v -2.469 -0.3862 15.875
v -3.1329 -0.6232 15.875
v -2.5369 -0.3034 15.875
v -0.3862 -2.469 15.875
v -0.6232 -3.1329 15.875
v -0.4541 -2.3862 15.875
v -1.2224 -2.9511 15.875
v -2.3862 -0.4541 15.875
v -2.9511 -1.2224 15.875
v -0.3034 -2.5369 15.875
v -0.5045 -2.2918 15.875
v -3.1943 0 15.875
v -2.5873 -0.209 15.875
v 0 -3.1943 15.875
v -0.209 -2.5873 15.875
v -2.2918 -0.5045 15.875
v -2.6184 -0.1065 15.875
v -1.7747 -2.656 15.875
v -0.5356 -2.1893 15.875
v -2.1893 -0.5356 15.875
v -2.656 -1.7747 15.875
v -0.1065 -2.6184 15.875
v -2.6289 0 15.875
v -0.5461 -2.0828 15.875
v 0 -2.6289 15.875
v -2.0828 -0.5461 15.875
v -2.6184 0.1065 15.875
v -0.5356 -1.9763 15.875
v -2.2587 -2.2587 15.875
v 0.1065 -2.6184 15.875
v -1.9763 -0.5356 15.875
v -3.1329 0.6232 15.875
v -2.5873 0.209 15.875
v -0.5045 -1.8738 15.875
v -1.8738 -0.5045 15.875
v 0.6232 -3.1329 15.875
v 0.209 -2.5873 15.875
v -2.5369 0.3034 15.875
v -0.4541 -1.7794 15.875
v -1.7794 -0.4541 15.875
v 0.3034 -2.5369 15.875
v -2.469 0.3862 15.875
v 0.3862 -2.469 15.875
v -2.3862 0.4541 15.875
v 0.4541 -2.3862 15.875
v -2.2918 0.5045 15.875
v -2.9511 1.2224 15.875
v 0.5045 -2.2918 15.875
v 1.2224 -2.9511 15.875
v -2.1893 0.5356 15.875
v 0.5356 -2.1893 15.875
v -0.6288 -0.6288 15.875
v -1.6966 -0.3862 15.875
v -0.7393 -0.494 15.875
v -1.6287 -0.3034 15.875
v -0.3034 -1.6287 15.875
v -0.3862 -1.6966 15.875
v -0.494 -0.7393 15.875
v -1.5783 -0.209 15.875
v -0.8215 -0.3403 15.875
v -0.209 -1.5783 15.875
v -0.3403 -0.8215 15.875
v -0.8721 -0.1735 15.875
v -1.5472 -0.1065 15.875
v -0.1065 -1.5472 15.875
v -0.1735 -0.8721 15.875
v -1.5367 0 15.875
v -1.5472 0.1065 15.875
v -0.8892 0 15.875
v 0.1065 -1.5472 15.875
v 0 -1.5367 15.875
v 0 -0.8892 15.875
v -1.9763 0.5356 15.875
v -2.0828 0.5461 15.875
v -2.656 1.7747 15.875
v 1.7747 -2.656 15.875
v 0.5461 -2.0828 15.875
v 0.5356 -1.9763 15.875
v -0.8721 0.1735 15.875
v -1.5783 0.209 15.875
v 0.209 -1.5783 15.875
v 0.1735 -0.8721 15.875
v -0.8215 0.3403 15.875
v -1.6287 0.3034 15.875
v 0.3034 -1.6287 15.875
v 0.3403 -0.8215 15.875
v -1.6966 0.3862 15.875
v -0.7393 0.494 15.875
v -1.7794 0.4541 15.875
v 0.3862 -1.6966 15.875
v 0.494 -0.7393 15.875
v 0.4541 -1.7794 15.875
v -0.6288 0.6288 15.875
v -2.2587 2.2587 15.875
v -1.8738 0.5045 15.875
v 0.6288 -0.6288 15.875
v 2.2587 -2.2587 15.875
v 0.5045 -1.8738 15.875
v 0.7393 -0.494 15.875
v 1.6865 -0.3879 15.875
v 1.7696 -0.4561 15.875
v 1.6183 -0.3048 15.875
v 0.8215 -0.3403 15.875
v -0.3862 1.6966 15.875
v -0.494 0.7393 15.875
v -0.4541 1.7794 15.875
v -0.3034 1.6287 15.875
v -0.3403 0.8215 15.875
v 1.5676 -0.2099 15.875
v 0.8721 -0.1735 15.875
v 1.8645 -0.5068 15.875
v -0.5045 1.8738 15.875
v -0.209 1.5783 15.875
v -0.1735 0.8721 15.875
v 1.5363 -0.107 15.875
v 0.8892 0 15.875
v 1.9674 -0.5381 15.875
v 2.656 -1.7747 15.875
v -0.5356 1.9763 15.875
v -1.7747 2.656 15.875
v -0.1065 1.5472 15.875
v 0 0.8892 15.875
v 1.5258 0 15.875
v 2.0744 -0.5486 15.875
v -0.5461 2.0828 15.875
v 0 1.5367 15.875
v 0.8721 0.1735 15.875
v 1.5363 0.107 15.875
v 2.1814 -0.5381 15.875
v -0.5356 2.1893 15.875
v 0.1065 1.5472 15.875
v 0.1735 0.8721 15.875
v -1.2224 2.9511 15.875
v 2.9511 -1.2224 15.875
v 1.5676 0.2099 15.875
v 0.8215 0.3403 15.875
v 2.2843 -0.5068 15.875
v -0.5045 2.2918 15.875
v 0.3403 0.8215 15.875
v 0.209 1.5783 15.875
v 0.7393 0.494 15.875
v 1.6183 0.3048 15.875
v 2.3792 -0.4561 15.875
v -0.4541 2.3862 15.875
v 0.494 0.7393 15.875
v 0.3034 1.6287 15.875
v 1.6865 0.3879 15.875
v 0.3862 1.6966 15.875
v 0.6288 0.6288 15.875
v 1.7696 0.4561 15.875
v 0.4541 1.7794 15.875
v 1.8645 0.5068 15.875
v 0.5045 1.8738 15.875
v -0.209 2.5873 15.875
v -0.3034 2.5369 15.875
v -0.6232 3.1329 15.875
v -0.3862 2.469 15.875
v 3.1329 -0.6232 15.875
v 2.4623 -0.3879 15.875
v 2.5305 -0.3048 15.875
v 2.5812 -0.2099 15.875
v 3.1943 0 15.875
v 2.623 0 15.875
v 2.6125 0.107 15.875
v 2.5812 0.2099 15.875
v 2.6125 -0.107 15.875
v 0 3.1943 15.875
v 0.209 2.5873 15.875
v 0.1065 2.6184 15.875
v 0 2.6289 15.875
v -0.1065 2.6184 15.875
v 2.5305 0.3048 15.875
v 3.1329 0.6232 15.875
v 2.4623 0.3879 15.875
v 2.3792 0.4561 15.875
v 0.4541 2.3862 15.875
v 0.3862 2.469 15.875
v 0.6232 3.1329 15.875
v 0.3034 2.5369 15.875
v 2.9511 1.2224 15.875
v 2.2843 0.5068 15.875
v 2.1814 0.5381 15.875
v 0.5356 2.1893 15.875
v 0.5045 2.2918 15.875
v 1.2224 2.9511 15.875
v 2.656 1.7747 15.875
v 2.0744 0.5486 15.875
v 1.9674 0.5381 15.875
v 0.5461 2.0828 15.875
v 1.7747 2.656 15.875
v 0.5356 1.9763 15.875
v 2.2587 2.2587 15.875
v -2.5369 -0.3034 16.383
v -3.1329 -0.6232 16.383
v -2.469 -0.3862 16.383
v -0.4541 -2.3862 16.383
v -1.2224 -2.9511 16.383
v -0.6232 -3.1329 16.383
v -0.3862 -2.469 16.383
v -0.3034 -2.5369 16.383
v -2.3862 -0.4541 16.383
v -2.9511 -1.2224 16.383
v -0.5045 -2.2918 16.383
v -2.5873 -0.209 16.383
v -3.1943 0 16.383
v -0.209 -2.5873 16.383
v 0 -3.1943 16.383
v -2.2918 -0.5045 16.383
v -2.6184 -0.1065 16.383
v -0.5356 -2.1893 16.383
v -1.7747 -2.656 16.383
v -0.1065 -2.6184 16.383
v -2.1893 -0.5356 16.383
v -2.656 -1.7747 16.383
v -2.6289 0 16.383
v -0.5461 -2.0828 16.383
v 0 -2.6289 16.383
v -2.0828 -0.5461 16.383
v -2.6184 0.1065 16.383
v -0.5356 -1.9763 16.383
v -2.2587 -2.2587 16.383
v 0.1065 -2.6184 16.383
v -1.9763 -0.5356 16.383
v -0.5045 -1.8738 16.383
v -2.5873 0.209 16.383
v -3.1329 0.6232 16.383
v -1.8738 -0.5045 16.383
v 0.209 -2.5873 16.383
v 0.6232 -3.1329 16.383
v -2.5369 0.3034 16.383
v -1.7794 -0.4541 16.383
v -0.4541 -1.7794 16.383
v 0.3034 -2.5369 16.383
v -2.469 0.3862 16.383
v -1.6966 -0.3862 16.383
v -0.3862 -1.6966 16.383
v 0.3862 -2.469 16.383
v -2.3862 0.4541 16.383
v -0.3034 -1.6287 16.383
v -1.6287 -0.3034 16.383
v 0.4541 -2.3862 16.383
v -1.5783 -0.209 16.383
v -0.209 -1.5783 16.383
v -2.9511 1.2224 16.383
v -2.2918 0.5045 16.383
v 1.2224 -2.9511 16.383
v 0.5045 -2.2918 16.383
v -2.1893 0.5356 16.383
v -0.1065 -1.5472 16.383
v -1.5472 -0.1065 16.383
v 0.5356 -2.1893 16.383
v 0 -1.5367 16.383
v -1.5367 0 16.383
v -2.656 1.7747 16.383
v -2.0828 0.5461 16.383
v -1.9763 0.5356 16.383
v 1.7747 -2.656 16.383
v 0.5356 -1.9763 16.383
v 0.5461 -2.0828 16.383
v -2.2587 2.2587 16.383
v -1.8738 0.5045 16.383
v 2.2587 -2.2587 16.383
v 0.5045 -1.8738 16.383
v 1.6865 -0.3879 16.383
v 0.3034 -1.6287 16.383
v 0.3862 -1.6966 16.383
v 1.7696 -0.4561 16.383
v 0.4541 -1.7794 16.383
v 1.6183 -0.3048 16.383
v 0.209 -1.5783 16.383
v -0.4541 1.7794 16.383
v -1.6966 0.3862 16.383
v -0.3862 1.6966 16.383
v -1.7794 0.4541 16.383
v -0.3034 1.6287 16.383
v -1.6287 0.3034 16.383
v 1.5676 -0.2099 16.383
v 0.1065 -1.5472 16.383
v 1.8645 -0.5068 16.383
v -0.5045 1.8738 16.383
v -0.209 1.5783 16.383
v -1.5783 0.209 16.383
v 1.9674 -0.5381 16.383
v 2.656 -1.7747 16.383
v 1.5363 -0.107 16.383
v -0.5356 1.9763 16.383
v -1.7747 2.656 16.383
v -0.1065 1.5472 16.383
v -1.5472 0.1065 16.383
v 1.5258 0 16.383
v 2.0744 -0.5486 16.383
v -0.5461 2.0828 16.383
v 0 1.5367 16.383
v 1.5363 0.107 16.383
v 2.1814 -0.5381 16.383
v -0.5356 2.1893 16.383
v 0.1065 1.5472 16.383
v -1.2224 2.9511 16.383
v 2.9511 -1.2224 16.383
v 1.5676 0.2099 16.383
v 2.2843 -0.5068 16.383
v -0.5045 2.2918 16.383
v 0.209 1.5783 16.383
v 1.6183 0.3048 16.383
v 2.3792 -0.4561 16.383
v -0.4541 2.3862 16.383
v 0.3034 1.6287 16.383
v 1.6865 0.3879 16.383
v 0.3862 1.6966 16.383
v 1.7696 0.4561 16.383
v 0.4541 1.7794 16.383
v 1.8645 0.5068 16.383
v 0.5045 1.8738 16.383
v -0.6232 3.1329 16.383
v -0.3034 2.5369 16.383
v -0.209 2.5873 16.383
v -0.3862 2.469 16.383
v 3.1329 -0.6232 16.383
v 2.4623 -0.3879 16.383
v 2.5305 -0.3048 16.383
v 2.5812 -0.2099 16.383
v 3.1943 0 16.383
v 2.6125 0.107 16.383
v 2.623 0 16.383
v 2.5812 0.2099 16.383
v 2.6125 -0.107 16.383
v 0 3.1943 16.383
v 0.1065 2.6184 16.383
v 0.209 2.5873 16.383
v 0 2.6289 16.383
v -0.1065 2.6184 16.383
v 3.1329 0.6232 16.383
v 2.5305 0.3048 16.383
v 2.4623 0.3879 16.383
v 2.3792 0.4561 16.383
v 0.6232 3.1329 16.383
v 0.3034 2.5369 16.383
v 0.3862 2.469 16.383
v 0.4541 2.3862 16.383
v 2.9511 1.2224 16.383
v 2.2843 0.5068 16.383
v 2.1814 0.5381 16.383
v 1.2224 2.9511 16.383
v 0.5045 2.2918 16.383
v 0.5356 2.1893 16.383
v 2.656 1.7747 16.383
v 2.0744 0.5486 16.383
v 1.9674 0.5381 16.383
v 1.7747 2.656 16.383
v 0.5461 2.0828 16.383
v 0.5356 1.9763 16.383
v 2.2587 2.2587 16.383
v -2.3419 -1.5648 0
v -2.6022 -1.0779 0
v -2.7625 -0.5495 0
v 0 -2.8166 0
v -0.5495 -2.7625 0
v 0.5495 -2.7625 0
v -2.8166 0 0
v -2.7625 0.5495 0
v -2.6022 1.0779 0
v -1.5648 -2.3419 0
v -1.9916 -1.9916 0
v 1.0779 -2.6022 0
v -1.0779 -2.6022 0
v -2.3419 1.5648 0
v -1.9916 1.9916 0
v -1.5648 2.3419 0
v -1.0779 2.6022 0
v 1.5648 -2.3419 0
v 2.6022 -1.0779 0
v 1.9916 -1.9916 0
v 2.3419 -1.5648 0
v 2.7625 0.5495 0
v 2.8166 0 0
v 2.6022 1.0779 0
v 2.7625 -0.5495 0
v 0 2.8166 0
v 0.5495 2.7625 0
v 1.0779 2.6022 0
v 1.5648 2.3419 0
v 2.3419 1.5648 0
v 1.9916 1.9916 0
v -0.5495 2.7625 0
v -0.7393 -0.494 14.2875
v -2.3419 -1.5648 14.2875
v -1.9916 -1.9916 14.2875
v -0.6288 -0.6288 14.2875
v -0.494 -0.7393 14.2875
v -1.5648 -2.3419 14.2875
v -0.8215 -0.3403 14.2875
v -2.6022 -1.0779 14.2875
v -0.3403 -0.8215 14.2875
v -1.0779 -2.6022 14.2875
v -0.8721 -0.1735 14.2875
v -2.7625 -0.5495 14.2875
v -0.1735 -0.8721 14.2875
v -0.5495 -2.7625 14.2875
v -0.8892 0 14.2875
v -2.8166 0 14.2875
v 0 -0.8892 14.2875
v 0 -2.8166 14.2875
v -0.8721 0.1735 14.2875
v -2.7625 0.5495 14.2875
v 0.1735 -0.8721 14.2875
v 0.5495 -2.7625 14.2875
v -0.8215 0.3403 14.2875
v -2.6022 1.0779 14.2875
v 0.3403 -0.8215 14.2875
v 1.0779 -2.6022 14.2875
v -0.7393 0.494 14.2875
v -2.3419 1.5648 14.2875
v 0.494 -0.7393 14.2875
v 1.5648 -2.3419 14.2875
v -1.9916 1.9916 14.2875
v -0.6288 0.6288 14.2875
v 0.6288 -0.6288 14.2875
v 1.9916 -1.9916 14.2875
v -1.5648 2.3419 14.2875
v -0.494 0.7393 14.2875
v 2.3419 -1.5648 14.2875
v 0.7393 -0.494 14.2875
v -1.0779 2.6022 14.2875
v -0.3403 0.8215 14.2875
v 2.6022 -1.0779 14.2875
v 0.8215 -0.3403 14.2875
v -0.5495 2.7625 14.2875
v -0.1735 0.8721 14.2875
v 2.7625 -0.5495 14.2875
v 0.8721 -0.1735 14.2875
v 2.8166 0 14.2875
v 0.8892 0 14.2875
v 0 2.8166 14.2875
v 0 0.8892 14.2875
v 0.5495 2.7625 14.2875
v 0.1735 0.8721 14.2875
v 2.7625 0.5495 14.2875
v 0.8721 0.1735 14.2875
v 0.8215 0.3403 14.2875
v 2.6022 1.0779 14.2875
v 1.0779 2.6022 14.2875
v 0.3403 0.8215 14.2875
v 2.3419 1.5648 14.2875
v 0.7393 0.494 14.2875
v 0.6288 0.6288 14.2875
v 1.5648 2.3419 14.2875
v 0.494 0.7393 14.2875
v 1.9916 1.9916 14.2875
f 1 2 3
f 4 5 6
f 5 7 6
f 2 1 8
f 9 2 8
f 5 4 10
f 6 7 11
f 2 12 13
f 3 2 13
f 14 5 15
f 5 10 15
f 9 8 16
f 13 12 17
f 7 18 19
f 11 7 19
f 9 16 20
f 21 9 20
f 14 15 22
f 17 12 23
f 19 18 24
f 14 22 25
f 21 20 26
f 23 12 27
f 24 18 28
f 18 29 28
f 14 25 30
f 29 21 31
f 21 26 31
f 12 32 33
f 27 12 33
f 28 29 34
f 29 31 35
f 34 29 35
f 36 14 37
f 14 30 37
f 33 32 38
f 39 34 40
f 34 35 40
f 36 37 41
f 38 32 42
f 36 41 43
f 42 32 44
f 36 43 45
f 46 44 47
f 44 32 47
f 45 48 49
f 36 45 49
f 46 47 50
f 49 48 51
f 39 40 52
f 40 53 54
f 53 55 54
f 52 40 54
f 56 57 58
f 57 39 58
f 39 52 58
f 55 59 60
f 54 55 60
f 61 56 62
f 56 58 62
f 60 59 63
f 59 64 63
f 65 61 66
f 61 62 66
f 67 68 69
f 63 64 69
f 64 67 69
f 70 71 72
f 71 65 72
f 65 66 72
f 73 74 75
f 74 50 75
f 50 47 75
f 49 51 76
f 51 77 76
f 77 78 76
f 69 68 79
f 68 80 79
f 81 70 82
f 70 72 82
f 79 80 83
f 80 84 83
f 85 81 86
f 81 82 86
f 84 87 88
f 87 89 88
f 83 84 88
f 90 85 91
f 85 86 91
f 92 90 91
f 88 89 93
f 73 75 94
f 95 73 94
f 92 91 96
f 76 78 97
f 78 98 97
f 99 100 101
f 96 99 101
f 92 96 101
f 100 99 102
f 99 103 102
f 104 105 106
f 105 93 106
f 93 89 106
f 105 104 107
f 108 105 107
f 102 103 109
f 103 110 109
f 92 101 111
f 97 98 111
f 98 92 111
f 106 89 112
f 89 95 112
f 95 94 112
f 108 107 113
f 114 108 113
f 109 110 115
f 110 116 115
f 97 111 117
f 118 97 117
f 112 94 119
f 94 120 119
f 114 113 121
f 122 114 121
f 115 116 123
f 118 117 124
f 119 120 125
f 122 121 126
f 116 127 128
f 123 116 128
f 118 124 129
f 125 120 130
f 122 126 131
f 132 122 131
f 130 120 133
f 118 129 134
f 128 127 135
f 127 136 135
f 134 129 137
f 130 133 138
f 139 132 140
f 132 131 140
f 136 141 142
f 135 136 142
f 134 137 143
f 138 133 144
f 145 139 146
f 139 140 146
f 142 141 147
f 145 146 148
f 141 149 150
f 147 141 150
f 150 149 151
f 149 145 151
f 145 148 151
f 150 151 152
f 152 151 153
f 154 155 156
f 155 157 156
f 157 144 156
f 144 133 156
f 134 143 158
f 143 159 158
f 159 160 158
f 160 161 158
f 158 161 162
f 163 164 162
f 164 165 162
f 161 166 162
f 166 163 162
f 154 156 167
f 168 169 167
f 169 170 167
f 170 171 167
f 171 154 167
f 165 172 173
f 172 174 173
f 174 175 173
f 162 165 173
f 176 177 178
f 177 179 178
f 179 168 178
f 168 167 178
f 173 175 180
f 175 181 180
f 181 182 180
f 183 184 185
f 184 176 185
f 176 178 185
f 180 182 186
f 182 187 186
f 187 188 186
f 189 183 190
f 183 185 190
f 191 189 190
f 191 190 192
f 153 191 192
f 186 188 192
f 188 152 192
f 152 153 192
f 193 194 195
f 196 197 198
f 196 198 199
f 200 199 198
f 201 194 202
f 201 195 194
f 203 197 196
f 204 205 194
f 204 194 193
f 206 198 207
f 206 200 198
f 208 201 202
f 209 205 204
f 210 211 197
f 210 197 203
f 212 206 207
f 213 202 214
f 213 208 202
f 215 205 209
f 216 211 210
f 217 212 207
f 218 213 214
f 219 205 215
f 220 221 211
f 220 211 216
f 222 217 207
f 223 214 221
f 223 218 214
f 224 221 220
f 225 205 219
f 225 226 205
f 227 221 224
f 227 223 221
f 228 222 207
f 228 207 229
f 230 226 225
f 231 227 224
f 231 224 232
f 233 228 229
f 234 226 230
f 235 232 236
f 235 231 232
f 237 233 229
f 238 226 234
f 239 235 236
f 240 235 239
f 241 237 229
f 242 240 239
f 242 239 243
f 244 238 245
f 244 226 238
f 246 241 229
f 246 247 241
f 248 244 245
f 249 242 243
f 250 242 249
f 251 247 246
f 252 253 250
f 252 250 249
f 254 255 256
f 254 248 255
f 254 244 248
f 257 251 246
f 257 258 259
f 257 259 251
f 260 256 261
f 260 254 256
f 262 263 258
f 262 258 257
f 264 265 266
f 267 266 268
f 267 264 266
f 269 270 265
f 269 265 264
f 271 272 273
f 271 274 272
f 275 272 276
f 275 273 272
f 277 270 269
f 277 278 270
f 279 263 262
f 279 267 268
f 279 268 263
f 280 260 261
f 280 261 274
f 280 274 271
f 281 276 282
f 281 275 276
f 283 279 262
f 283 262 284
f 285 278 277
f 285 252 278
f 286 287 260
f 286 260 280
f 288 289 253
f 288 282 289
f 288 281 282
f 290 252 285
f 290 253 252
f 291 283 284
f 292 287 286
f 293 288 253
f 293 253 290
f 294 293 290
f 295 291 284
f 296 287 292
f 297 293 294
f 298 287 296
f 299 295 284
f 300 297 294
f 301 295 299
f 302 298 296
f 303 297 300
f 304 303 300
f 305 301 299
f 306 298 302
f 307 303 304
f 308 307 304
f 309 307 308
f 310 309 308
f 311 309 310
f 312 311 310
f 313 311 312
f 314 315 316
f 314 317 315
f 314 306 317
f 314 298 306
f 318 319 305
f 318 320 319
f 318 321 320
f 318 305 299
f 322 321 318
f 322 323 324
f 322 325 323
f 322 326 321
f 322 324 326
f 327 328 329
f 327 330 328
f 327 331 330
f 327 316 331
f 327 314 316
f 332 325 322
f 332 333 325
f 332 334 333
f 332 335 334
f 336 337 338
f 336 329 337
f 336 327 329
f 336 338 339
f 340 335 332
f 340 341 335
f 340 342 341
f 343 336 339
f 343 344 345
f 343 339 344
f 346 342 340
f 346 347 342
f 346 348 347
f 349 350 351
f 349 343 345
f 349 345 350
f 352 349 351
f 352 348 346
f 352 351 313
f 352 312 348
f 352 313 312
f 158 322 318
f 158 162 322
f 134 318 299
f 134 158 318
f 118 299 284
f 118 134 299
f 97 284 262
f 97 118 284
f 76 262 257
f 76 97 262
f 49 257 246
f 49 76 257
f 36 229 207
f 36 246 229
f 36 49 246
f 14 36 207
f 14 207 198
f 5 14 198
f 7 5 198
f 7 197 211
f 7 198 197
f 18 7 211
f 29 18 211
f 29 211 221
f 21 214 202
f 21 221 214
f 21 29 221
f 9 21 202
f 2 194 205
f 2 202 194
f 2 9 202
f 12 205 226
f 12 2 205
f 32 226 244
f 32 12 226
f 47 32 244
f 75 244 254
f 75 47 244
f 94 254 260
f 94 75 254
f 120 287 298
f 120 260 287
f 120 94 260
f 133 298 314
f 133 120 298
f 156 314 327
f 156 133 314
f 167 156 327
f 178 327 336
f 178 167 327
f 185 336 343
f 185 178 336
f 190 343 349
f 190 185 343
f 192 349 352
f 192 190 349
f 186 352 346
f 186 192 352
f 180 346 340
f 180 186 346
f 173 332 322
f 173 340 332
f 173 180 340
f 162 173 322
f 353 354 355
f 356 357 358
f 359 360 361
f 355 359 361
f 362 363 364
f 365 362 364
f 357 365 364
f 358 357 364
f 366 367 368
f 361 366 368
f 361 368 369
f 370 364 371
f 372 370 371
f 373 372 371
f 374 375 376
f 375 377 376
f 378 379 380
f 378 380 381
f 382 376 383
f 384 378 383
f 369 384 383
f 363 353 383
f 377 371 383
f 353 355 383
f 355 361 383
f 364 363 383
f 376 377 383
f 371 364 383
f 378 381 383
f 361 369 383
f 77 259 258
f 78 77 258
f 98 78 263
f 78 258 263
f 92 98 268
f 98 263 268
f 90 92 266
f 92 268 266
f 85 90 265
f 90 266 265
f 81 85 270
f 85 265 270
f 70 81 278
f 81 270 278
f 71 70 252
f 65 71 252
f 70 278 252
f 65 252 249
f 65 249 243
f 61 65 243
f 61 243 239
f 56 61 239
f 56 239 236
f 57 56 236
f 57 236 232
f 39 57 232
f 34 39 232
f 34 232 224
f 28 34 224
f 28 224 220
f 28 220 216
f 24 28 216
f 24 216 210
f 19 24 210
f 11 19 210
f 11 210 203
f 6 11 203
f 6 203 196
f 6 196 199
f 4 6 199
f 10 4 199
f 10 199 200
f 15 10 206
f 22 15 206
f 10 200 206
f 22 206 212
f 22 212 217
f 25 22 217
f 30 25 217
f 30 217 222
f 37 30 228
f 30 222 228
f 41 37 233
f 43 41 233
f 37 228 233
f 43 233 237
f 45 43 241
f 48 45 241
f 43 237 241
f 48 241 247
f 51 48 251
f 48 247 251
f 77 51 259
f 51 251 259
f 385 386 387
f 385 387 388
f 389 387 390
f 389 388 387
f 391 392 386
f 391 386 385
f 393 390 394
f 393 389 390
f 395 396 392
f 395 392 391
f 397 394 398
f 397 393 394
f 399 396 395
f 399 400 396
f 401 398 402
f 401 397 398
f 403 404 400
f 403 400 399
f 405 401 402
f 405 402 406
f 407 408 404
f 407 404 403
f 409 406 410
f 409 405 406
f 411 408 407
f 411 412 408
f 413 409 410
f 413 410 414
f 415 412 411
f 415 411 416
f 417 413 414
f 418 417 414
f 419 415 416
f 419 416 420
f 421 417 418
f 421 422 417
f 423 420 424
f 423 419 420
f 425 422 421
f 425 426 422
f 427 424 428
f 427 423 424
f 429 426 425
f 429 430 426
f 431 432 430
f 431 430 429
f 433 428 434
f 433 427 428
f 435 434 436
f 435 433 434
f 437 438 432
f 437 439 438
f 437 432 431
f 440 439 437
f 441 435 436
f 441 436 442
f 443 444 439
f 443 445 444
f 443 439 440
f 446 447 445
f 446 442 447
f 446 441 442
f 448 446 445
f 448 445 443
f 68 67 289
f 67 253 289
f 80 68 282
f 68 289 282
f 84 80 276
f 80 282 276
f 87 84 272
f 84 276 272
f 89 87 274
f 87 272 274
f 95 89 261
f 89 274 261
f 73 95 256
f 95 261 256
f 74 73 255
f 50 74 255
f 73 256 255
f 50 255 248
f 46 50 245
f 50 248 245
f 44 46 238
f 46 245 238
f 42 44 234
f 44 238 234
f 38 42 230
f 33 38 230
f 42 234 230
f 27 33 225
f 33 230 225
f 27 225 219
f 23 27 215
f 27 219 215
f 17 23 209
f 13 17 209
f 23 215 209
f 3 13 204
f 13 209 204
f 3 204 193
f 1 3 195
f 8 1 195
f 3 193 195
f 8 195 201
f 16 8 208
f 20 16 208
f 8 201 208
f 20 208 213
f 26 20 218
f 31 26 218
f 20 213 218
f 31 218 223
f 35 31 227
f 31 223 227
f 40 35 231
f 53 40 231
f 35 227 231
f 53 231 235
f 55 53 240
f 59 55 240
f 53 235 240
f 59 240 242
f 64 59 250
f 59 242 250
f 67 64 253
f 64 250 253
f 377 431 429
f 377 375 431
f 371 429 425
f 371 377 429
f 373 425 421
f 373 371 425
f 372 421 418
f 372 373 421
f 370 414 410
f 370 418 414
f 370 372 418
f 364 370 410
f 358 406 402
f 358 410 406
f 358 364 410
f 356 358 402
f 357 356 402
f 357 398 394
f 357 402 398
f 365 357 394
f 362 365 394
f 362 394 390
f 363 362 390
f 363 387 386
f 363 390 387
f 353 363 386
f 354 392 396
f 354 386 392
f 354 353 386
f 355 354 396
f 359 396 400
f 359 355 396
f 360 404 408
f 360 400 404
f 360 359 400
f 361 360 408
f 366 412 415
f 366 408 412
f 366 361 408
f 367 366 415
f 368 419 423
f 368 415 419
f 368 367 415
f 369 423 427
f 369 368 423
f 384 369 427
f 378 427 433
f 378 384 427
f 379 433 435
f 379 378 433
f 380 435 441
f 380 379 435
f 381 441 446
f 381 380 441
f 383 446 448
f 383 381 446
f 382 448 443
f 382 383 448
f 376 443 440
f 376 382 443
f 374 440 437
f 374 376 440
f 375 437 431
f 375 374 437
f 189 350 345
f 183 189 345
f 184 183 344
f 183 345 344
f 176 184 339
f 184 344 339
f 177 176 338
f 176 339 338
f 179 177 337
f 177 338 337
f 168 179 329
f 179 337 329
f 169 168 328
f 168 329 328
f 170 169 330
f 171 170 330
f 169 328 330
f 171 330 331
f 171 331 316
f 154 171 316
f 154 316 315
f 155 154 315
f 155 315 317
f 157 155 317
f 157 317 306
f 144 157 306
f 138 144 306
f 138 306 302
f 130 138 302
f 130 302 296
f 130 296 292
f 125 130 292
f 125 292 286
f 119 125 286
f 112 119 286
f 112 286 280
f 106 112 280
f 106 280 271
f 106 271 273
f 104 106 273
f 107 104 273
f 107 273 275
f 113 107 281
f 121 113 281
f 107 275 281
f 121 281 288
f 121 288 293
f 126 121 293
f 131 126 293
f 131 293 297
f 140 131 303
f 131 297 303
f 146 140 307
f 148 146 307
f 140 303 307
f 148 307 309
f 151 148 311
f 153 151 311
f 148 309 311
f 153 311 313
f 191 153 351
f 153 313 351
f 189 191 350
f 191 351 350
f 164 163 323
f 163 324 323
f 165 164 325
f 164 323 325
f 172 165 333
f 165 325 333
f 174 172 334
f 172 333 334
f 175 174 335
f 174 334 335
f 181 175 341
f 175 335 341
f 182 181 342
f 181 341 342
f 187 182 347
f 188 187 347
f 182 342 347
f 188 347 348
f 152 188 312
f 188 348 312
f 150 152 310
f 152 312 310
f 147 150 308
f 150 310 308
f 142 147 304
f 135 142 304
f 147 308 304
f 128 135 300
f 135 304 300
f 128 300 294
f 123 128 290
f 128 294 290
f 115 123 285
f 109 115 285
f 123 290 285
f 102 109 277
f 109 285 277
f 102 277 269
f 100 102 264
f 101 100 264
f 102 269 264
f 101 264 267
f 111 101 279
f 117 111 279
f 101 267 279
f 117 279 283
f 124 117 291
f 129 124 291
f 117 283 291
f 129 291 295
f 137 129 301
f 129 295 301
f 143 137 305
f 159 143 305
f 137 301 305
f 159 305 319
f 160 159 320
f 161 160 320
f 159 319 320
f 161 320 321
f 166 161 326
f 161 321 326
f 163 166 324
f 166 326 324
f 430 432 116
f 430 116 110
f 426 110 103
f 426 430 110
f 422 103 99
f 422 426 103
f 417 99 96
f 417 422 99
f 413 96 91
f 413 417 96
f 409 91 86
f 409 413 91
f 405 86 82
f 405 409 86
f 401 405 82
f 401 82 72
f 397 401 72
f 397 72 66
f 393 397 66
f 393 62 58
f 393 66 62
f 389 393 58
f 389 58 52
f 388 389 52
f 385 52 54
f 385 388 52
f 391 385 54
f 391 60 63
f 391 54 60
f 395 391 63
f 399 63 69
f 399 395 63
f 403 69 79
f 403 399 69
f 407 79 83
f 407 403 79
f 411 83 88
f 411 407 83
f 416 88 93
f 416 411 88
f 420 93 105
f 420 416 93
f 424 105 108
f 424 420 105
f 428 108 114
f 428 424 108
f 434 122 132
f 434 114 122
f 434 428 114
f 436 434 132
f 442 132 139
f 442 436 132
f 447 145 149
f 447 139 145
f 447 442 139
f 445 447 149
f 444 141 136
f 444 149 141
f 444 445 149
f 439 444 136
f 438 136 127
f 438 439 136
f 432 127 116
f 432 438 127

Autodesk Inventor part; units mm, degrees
ref_plane "YZ Plane" through (0, 0, 0) normal (1, 0, 0) x (0, 1, 0)
ref_plane "XZ Plane" through (0, 0, 0) normal (0, 1, 0) x (-1, 0, 0)
ref_plane "XY Plane" through (0, 0, 0) normal (0, 0, 1) x (1, 0, 0)
sketch "Sketch1" plane through (0, 0, 0) normal (0, 0, 1) x (1, 0, 0)
  circle A0 centre (0, 0) radius 2.8166
extrude "Extrusion1" add sketch "Sketch1" along normal blind 14.2875
sketch "Sketch2" plane through (0, 0, 14.2875) normal (0, 0, 1) x (1, 0, 0)
  circle A0 centre (0, 0) radius 0.8892
extrude "Extrusion2" add sketch "Sketch2" along normal blind 1.5875
sketch "Sketch3" plane through (0, 0, 15.875) normal (0, 0, 1) x (1, 0, 0)
  circle A0 centre (0, 0) radius 3.1943
extrude "Extrusion3" add sketch "Sketch3" along normal blind 0.508
sketch "Sketch4" plane through (0, 0, 16.383) normal (0, 0, 1) x (1, 0, 0)
  point P0 (0, 0)
sketch "Sketch5" plane through (0, 0, 16.383) normal (0, 0, 1) x (1, 0, 0)
  circle A0 centre (0, 0) radius 3.1943
  circle A1 centre (2.0744, 0) radius 0.5486
  circle A2 centre (0, -2.0828) radius 0.5461
  circle A3 centre (-2.0828, 0) radius 0.5461
  circle A4 centre (0, 2.0828) radius 0.5461
extrude "Extrusion4" cut sketch "Sketch5" against normal blind 0.508 contours A1 | A2 | A3 | A4
sketch "Sketch6" plane through (0, 0, 16.383) normal (0, 0, 1) x (1, 0, 0)
  point P0 (0, 0)
properties part number "Cylinder"
